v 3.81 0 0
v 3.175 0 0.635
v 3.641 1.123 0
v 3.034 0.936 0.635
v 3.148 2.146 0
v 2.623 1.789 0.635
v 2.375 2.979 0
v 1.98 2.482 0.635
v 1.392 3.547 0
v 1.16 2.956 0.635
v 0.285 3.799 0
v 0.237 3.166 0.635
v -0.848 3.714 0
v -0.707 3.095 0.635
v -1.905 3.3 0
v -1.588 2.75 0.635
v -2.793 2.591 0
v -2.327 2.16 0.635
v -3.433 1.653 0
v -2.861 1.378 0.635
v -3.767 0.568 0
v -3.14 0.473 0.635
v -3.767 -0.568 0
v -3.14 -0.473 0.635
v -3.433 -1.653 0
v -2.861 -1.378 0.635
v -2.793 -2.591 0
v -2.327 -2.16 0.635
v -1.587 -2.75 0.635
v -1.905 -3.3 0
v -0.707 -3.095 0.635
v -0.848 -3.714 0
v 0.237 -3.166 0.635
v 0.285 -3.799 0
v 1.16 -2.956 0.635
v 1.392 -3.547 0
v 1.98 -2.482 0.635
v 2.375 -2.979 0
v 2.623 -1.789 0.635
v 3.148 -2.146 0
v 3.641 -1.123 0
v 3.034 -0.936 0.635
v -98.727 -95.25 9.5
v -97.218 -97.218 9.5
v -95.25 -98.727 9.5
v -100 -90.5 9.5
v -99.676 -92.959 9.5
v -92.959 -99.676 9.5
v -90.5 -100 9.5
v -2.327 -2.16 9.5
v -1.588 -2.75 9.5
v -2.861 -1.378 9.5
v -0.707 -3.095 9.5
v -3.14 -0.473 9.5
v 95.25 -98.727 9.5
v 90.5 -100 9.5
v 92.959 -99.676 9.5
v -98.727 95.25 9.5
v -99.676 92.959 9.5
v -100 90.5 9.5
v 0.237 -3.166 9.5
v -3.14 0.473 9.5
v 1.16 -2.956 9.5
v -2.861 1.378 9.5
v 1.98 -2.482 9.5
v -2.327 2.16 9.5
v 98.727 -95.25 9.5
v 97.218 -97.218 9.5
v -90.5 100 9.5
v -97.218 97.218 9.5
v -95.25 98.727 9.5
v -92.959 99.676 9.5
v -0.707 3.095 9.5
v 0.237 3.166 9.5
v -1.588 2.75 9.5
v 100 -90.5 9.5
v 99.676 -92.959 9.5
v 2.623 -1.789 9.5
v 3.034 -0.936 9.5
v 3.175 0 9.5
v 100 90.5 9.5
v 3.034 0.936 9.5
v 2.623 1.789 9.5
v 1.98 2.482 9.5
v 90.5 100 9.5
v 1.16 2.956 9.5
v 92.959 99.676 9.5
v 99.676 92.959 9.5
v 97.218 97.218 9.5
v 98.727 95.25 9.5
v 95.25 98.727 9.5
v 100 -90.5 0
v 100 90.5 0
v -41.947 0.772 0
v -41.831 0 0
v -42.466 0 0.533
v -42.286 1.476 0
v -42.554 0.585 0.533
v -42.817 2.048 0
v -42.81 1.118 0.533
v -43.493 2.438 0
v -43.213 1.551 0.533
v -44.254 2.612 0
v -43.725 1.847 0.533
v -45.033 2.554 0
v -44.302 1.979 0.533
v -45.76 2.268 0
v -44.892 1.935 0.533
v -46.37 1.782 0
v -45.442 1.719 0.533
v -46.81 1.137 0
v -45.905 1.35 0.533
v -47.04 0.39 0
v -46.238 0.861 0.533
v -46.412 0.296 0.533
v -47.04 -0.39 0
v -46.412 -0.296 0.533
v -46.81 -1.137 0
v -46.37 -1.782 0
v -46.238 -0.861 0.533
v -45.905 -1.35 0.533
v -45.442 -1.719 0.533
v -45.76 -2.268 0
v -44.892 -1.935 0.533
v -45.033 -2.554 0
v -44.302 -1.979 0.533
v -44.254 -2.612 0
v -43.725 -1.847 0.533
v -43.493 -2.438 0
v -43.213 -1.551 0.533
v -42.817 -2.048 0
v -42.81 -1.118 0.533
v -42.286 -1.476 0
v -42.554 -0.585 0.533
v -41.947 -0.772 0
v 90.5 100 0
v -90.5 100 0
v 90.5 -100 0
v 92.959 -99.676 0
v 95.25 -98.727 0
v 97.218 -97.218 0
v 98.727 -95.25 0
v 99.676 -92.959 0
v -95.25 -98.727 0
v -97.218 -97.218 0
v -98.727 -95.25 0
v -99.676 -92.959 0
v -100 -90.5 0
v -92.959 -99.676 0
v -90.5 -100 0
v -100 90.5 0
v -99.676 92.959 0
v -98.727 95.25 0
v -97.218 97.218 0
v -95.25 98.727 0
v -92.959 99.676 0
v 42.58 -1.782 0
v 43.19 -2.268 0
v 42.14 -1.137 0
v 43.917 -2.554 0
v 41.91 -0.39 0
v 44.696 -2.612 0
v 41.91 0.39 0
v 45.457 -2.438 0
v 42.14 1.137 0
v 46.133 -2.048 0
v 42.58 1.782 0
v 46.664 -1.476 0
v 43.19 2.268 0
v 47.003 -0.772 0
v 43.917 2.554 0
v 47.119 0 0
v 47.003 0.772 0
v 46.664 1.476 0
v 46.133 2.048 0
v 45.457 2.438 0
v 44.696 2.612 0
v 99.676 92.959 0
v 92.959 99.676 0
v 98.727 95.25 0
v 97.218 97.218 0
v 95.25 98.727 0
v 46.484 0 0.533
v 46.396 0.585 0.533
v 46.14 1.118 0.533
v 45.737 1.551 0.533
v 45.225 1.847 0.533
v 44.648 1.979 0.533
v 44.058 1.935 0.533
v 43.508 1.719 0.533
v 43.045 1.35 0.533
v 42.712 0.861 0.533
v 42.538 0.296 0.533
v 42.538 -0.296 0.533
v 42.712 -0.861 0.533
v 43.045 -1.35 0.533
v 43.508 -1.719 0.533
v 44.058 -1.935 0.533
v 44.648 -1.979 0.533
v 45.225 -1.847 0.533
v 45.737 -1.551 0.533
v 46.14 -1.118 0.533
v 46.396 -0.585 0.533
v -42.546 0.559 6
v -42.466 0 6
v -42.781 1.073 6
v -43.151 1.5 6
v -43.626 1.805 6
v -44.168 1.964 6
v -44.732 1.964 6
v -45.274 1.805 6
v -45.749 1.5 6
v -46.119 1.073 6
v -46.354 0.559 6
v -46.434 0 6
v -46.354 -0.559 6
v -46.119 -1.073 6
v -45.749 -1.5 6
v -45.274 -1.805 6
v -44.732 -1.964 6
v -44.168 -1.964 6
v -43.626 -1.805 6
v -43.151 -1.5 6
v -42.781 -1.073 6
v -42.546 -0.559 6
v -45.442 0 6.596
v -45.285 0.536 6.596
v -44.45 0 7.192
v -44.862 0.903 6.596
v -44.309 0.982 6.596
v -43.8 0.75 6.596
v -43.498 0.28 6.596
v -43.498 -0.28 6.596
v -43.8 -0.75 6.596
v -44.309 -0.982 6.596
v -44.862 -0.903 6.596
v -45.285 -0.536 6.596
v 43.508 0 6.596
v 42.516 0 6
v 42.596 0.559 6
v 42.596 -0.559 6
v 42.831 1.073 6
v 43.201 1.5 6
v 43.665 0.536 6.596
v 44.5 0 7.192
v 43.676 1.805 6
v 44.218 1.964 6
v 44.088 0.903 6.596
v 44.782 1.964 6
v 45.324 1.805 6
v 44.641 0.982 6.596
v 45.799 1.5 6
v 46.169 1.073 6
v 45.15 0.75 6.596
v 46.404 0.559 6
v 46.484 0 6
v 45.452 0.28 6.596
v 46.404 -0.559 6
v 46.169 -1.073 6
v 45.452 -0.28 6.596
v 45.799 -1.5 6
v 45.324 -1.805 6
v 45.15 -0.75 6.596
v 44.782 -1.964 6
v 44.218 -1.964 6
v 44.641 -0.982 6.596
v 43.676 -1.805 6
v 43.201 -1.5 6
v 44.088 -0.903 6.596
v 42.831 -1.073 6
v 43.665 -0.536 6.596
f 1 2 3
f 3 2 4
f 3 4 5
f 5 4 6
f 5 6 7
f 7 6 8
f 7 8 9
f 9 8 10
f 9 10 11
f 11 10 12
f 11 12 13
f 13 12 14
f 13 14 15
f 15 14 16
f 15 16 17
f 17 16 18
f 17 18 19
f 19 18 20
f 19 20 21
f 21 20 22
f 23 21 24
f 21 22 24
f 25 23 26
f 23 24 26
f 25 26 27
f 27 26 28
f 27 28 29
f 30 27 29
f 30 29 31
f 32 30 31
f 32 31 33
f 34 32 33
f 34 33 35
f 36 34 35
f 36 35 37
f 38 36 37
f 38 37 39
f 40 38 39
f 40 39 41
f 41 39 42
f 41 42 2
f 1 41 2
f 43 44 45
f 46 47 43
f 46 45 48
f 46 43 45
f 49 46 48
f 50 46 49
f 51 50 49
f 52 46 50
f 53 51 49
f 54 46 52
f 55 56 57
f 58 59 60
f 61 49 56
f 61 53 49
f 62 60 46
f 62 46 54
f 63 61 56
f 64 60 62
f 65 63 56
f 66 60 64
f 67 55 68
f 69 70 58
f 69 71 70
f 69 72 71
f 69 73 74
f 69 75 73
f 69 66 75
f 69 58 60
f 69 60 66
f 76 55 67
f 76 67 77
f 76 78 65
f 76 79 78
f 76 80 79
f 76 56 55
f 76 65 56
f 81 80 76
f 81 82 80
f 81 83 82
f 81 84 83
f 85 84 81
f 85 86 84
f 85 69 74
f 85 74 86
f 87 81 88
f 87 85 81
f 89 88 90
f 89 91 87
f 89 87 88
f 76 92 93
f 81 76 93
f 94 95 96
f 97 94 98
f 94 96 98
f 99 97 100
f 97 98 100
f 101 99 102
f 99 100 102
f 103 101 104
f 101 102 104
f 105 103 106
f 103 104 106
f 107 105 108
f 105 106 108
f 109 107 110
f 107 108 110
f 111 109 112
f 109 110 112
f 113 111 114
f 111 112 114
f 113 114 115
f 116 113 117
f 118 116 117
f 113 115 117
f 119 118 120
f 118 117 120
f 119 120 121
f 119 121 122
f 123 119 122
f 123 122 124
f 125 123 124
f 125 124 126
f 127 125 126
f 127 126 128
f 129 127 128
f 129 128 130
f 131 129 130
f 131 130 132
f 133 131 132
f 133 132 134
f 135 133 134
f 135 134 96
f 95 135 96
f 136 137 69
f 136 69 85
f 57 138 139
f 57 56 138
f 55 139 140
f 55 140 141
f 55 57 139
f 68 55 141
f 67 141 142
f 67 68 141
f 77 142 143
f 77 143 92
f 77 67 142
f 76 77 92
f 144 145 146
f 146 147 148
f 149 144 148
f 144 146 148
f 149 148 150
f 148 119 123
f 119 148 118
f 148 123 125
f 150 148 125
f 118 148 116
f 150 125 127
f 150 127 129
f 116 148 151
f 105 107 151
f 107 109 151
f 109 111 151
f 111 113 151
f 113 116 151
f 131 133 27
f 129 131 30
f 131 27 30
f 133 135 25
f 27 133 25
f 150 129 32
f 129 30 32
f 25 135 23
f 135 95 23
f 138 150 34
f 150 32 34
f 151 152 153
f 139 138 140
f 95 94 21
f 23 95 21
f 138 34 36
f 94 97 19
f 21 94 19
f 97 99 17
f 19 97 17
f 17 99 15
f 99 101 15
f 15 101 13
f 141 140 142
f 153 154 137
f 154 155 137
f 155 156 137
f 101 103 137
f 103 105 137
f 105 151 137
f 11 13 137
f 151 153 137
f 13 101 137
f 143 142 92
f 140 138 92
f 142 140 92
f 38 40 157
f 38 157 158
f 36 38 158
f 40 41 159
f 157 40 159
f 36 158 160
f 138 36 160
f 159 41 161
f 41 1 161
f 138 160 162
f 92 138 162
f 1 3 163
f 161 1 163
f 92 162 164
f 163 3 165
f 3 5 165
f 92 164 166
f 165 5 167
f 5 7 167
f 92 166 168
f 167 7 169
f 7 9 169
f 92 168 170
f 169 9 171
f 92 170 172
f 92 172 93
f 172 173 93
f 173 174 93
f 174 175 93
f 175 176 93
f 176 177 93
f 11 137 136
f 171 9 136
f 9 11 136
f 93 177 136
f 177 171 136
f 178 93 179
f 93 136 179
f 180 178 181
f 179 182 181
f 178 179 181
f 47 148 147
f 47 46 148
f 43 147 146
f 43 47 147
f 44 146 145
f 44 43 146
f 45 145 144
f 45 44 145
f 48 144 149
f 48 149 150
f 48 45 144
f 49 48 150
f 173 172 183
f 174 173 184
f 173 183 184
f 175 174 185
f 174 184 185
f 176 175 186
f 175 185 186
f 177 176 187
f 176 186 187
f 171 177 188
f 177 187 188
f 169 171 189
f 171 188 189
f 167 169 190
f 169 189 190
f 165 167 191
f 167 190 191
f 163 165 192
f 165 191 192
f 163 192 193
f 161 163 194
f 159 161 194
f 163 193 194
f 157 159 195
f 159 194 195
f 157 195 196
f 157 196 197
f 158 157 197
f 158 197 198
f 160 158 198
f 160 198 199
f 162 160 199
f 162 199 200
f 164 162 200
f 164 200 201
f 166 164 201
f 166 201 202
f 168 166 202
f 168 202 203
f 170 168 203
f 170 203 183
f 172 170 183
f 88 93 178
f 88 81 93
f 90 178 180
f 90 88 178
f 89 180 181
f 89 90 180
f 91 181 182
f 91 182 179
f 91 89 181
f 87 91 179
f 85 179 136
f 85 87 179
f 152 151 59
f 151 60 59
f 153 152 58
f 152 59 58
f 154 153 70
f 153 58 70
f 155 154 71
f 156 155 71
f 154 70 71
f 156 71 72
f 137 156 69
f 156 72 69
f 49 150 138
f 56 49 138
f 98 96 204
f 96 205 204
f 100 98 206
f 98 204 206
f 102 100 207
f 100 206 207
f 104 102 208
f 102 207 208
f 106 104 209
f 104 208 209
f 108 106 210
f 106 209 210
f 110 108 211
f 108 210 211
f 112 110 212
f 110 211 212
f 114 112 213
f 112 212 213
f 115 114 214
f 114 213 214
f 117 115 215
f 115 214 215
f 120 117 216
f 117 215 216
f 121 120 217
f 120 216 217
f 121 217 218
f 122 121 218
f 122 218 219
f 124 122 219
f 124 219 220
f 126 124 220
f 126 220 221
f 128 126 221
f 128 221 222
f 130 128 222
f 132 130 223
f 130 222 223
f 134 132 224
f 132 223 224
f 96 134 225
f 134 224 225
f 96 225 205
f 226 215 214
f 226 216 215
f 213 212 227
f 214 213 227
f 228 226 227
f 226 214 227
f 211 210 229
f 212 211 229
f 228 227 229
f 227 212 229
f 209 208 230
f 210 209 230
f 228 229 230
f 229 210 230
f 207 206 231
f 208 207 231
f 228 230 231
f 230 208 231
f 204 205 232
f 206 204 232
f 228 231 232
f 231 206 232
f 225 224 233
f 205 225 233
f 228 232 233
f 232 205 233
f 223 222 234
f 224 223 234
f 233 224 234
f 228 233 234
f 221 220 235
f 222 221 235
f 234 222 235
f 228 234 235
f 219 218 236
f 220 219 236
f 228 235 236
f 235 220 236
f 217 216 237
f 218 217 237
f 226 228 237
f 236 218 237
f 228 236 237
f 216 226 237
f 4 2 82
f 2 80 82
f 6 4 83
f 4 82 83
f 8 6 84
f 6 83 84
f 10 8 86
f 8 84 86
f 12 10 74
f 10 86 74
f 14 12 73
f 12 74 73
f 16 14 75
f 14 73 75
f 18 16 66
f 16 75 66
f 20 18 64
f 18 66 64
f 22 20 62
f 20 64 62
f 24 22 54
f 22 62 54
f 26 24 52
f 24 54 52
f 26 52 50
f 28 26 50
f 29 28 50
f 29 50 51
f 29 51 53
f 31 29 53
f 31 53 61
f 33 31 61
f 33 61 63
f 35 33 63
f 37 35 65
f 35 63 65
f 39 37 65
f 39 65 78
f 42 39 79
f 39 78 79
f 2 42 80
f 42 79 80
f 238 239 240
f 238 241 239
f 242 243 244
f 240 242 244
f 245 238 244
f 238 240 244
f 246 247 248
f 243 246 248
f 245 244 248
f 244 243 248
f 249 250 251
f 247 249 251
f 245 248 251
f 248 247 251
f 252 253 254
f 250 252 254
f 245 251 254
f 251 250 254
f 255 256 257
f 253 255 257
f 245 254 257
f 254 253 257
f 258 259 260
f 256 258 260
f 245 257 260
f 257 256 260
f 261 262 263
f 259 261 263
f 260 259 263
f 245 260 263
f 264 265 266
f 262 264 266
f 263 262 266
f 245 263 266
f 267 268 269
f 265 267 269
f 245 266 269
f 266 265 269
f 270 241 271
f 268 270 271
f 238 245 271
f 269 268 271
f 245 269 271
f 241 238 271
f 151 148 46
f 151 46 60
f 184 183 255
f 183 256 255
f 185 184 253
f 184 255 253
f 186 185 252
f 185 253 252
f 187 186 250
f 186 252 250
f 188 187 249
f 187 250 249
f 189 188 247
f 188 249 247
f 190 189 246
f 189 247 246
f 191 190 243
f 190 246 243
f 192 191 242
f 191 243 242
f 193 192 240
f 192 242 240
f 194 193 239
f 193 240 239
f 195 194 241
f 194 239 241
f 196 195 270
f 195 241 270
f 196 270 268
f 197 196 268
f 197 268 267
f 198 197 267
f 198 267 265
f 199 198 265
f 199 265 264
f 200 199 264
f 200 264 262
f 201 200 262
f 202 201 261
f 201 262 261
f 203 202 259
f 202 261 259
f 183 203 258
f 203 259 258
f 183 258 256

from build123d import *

# Parameters (mm, degrees)
BASEPLATE_W                      = 200
BASEPLATE_H                      = 200
BOSS_EXTRUDE1_DEPTH              = 9.5
FILLET1_R                        = 9.5
F_1_4_INCH_BOLT_HOLE_D           = 6.35
F_1_4_INCH_BOLT_HOLE_CSINK_D     = 7.62
F_1_4_INCH_BOLT_HOLE_CSINK_ANGLE = 90
F_5_32_DOWEL_HOLE_D              = 3.96875
F_5_32_DOWEL_HOLE_DEPTH          = 6
F_5_32_DOWEL_HOLE_CSINK_D        = 5.23875
F_5_32_DOWEL_HOLE_CSINK_ANGLE    = 100
F_5_32_DOWEL_HOLE_TIP            = 1.192332791


with BuildPart() as part:
    # Baseplate → Boss-Extrude1 (new body)
    with BuildSketch(Plane.XY):
        Rectangle(BASEPLATE_W, BASEPLATE_H)
    extrude(amount=BOSS_EXTRUDE1_DEPTH)

    # Fillet1
    fillet1_edges = [part.edges().sort_by_distance(p)[0] for p in [
        (100, -100, 4.75),
        (-100, -100, 4.75),
        (-100, 100, 4.75),
        (100, 100, 4.75),
    ]]
    fillet(fillet1_edges, radius=FILLET1_R)

    # 1/4 Inch Bolt Hole (through all)
    with Locations(Plane(origin=(0, 0, 0), x_dir=(-1, 0, 0), z_dir=(0, 0, -1))):
        with Locations((0, 0)):
            CounterSinkHole(F_1_4_INCH_BOLT_HOLE_D / 2, F_1_4_INCH_BOLT_HOLE_CSINK_D / 2, counter_sink_angle=F_1_4_INCH_BOLT_HOLE_CSINK_ANGLE)

    # 5/32 Dowel Hole
    with Locations(Plane(origin=(0, 0, 0), x_dir=(-1, 0, 0), z_dir=(0, 0, -1))):
        with Locations((-44.5, 0), (44.45, 0)):
            CounterSinkHole(F_5_32_DOWEL_HOLE_D / 2, F_5_32_DOWEL_HOLE_CSINK_D / 2, depth=F_5_32_DOWEL_HOLE_DEPTH, counter_sink_angle=F_5_32_DOWEL_HOLE_CSINK_ANGLE)
            with Locations((0, 0, -(F_5_32_DOWEL_HOLE_DEPTH + F_5_32_DOWEL_HOLE_TIP / 2))):  # 118° drill point
                Cone(0, F_5_32_DOWEL_HOLE_D / 2, F_5_32_DOWEL_HOLE_TIP, mode=Mode.SUBTRACT)


solid = part.part
